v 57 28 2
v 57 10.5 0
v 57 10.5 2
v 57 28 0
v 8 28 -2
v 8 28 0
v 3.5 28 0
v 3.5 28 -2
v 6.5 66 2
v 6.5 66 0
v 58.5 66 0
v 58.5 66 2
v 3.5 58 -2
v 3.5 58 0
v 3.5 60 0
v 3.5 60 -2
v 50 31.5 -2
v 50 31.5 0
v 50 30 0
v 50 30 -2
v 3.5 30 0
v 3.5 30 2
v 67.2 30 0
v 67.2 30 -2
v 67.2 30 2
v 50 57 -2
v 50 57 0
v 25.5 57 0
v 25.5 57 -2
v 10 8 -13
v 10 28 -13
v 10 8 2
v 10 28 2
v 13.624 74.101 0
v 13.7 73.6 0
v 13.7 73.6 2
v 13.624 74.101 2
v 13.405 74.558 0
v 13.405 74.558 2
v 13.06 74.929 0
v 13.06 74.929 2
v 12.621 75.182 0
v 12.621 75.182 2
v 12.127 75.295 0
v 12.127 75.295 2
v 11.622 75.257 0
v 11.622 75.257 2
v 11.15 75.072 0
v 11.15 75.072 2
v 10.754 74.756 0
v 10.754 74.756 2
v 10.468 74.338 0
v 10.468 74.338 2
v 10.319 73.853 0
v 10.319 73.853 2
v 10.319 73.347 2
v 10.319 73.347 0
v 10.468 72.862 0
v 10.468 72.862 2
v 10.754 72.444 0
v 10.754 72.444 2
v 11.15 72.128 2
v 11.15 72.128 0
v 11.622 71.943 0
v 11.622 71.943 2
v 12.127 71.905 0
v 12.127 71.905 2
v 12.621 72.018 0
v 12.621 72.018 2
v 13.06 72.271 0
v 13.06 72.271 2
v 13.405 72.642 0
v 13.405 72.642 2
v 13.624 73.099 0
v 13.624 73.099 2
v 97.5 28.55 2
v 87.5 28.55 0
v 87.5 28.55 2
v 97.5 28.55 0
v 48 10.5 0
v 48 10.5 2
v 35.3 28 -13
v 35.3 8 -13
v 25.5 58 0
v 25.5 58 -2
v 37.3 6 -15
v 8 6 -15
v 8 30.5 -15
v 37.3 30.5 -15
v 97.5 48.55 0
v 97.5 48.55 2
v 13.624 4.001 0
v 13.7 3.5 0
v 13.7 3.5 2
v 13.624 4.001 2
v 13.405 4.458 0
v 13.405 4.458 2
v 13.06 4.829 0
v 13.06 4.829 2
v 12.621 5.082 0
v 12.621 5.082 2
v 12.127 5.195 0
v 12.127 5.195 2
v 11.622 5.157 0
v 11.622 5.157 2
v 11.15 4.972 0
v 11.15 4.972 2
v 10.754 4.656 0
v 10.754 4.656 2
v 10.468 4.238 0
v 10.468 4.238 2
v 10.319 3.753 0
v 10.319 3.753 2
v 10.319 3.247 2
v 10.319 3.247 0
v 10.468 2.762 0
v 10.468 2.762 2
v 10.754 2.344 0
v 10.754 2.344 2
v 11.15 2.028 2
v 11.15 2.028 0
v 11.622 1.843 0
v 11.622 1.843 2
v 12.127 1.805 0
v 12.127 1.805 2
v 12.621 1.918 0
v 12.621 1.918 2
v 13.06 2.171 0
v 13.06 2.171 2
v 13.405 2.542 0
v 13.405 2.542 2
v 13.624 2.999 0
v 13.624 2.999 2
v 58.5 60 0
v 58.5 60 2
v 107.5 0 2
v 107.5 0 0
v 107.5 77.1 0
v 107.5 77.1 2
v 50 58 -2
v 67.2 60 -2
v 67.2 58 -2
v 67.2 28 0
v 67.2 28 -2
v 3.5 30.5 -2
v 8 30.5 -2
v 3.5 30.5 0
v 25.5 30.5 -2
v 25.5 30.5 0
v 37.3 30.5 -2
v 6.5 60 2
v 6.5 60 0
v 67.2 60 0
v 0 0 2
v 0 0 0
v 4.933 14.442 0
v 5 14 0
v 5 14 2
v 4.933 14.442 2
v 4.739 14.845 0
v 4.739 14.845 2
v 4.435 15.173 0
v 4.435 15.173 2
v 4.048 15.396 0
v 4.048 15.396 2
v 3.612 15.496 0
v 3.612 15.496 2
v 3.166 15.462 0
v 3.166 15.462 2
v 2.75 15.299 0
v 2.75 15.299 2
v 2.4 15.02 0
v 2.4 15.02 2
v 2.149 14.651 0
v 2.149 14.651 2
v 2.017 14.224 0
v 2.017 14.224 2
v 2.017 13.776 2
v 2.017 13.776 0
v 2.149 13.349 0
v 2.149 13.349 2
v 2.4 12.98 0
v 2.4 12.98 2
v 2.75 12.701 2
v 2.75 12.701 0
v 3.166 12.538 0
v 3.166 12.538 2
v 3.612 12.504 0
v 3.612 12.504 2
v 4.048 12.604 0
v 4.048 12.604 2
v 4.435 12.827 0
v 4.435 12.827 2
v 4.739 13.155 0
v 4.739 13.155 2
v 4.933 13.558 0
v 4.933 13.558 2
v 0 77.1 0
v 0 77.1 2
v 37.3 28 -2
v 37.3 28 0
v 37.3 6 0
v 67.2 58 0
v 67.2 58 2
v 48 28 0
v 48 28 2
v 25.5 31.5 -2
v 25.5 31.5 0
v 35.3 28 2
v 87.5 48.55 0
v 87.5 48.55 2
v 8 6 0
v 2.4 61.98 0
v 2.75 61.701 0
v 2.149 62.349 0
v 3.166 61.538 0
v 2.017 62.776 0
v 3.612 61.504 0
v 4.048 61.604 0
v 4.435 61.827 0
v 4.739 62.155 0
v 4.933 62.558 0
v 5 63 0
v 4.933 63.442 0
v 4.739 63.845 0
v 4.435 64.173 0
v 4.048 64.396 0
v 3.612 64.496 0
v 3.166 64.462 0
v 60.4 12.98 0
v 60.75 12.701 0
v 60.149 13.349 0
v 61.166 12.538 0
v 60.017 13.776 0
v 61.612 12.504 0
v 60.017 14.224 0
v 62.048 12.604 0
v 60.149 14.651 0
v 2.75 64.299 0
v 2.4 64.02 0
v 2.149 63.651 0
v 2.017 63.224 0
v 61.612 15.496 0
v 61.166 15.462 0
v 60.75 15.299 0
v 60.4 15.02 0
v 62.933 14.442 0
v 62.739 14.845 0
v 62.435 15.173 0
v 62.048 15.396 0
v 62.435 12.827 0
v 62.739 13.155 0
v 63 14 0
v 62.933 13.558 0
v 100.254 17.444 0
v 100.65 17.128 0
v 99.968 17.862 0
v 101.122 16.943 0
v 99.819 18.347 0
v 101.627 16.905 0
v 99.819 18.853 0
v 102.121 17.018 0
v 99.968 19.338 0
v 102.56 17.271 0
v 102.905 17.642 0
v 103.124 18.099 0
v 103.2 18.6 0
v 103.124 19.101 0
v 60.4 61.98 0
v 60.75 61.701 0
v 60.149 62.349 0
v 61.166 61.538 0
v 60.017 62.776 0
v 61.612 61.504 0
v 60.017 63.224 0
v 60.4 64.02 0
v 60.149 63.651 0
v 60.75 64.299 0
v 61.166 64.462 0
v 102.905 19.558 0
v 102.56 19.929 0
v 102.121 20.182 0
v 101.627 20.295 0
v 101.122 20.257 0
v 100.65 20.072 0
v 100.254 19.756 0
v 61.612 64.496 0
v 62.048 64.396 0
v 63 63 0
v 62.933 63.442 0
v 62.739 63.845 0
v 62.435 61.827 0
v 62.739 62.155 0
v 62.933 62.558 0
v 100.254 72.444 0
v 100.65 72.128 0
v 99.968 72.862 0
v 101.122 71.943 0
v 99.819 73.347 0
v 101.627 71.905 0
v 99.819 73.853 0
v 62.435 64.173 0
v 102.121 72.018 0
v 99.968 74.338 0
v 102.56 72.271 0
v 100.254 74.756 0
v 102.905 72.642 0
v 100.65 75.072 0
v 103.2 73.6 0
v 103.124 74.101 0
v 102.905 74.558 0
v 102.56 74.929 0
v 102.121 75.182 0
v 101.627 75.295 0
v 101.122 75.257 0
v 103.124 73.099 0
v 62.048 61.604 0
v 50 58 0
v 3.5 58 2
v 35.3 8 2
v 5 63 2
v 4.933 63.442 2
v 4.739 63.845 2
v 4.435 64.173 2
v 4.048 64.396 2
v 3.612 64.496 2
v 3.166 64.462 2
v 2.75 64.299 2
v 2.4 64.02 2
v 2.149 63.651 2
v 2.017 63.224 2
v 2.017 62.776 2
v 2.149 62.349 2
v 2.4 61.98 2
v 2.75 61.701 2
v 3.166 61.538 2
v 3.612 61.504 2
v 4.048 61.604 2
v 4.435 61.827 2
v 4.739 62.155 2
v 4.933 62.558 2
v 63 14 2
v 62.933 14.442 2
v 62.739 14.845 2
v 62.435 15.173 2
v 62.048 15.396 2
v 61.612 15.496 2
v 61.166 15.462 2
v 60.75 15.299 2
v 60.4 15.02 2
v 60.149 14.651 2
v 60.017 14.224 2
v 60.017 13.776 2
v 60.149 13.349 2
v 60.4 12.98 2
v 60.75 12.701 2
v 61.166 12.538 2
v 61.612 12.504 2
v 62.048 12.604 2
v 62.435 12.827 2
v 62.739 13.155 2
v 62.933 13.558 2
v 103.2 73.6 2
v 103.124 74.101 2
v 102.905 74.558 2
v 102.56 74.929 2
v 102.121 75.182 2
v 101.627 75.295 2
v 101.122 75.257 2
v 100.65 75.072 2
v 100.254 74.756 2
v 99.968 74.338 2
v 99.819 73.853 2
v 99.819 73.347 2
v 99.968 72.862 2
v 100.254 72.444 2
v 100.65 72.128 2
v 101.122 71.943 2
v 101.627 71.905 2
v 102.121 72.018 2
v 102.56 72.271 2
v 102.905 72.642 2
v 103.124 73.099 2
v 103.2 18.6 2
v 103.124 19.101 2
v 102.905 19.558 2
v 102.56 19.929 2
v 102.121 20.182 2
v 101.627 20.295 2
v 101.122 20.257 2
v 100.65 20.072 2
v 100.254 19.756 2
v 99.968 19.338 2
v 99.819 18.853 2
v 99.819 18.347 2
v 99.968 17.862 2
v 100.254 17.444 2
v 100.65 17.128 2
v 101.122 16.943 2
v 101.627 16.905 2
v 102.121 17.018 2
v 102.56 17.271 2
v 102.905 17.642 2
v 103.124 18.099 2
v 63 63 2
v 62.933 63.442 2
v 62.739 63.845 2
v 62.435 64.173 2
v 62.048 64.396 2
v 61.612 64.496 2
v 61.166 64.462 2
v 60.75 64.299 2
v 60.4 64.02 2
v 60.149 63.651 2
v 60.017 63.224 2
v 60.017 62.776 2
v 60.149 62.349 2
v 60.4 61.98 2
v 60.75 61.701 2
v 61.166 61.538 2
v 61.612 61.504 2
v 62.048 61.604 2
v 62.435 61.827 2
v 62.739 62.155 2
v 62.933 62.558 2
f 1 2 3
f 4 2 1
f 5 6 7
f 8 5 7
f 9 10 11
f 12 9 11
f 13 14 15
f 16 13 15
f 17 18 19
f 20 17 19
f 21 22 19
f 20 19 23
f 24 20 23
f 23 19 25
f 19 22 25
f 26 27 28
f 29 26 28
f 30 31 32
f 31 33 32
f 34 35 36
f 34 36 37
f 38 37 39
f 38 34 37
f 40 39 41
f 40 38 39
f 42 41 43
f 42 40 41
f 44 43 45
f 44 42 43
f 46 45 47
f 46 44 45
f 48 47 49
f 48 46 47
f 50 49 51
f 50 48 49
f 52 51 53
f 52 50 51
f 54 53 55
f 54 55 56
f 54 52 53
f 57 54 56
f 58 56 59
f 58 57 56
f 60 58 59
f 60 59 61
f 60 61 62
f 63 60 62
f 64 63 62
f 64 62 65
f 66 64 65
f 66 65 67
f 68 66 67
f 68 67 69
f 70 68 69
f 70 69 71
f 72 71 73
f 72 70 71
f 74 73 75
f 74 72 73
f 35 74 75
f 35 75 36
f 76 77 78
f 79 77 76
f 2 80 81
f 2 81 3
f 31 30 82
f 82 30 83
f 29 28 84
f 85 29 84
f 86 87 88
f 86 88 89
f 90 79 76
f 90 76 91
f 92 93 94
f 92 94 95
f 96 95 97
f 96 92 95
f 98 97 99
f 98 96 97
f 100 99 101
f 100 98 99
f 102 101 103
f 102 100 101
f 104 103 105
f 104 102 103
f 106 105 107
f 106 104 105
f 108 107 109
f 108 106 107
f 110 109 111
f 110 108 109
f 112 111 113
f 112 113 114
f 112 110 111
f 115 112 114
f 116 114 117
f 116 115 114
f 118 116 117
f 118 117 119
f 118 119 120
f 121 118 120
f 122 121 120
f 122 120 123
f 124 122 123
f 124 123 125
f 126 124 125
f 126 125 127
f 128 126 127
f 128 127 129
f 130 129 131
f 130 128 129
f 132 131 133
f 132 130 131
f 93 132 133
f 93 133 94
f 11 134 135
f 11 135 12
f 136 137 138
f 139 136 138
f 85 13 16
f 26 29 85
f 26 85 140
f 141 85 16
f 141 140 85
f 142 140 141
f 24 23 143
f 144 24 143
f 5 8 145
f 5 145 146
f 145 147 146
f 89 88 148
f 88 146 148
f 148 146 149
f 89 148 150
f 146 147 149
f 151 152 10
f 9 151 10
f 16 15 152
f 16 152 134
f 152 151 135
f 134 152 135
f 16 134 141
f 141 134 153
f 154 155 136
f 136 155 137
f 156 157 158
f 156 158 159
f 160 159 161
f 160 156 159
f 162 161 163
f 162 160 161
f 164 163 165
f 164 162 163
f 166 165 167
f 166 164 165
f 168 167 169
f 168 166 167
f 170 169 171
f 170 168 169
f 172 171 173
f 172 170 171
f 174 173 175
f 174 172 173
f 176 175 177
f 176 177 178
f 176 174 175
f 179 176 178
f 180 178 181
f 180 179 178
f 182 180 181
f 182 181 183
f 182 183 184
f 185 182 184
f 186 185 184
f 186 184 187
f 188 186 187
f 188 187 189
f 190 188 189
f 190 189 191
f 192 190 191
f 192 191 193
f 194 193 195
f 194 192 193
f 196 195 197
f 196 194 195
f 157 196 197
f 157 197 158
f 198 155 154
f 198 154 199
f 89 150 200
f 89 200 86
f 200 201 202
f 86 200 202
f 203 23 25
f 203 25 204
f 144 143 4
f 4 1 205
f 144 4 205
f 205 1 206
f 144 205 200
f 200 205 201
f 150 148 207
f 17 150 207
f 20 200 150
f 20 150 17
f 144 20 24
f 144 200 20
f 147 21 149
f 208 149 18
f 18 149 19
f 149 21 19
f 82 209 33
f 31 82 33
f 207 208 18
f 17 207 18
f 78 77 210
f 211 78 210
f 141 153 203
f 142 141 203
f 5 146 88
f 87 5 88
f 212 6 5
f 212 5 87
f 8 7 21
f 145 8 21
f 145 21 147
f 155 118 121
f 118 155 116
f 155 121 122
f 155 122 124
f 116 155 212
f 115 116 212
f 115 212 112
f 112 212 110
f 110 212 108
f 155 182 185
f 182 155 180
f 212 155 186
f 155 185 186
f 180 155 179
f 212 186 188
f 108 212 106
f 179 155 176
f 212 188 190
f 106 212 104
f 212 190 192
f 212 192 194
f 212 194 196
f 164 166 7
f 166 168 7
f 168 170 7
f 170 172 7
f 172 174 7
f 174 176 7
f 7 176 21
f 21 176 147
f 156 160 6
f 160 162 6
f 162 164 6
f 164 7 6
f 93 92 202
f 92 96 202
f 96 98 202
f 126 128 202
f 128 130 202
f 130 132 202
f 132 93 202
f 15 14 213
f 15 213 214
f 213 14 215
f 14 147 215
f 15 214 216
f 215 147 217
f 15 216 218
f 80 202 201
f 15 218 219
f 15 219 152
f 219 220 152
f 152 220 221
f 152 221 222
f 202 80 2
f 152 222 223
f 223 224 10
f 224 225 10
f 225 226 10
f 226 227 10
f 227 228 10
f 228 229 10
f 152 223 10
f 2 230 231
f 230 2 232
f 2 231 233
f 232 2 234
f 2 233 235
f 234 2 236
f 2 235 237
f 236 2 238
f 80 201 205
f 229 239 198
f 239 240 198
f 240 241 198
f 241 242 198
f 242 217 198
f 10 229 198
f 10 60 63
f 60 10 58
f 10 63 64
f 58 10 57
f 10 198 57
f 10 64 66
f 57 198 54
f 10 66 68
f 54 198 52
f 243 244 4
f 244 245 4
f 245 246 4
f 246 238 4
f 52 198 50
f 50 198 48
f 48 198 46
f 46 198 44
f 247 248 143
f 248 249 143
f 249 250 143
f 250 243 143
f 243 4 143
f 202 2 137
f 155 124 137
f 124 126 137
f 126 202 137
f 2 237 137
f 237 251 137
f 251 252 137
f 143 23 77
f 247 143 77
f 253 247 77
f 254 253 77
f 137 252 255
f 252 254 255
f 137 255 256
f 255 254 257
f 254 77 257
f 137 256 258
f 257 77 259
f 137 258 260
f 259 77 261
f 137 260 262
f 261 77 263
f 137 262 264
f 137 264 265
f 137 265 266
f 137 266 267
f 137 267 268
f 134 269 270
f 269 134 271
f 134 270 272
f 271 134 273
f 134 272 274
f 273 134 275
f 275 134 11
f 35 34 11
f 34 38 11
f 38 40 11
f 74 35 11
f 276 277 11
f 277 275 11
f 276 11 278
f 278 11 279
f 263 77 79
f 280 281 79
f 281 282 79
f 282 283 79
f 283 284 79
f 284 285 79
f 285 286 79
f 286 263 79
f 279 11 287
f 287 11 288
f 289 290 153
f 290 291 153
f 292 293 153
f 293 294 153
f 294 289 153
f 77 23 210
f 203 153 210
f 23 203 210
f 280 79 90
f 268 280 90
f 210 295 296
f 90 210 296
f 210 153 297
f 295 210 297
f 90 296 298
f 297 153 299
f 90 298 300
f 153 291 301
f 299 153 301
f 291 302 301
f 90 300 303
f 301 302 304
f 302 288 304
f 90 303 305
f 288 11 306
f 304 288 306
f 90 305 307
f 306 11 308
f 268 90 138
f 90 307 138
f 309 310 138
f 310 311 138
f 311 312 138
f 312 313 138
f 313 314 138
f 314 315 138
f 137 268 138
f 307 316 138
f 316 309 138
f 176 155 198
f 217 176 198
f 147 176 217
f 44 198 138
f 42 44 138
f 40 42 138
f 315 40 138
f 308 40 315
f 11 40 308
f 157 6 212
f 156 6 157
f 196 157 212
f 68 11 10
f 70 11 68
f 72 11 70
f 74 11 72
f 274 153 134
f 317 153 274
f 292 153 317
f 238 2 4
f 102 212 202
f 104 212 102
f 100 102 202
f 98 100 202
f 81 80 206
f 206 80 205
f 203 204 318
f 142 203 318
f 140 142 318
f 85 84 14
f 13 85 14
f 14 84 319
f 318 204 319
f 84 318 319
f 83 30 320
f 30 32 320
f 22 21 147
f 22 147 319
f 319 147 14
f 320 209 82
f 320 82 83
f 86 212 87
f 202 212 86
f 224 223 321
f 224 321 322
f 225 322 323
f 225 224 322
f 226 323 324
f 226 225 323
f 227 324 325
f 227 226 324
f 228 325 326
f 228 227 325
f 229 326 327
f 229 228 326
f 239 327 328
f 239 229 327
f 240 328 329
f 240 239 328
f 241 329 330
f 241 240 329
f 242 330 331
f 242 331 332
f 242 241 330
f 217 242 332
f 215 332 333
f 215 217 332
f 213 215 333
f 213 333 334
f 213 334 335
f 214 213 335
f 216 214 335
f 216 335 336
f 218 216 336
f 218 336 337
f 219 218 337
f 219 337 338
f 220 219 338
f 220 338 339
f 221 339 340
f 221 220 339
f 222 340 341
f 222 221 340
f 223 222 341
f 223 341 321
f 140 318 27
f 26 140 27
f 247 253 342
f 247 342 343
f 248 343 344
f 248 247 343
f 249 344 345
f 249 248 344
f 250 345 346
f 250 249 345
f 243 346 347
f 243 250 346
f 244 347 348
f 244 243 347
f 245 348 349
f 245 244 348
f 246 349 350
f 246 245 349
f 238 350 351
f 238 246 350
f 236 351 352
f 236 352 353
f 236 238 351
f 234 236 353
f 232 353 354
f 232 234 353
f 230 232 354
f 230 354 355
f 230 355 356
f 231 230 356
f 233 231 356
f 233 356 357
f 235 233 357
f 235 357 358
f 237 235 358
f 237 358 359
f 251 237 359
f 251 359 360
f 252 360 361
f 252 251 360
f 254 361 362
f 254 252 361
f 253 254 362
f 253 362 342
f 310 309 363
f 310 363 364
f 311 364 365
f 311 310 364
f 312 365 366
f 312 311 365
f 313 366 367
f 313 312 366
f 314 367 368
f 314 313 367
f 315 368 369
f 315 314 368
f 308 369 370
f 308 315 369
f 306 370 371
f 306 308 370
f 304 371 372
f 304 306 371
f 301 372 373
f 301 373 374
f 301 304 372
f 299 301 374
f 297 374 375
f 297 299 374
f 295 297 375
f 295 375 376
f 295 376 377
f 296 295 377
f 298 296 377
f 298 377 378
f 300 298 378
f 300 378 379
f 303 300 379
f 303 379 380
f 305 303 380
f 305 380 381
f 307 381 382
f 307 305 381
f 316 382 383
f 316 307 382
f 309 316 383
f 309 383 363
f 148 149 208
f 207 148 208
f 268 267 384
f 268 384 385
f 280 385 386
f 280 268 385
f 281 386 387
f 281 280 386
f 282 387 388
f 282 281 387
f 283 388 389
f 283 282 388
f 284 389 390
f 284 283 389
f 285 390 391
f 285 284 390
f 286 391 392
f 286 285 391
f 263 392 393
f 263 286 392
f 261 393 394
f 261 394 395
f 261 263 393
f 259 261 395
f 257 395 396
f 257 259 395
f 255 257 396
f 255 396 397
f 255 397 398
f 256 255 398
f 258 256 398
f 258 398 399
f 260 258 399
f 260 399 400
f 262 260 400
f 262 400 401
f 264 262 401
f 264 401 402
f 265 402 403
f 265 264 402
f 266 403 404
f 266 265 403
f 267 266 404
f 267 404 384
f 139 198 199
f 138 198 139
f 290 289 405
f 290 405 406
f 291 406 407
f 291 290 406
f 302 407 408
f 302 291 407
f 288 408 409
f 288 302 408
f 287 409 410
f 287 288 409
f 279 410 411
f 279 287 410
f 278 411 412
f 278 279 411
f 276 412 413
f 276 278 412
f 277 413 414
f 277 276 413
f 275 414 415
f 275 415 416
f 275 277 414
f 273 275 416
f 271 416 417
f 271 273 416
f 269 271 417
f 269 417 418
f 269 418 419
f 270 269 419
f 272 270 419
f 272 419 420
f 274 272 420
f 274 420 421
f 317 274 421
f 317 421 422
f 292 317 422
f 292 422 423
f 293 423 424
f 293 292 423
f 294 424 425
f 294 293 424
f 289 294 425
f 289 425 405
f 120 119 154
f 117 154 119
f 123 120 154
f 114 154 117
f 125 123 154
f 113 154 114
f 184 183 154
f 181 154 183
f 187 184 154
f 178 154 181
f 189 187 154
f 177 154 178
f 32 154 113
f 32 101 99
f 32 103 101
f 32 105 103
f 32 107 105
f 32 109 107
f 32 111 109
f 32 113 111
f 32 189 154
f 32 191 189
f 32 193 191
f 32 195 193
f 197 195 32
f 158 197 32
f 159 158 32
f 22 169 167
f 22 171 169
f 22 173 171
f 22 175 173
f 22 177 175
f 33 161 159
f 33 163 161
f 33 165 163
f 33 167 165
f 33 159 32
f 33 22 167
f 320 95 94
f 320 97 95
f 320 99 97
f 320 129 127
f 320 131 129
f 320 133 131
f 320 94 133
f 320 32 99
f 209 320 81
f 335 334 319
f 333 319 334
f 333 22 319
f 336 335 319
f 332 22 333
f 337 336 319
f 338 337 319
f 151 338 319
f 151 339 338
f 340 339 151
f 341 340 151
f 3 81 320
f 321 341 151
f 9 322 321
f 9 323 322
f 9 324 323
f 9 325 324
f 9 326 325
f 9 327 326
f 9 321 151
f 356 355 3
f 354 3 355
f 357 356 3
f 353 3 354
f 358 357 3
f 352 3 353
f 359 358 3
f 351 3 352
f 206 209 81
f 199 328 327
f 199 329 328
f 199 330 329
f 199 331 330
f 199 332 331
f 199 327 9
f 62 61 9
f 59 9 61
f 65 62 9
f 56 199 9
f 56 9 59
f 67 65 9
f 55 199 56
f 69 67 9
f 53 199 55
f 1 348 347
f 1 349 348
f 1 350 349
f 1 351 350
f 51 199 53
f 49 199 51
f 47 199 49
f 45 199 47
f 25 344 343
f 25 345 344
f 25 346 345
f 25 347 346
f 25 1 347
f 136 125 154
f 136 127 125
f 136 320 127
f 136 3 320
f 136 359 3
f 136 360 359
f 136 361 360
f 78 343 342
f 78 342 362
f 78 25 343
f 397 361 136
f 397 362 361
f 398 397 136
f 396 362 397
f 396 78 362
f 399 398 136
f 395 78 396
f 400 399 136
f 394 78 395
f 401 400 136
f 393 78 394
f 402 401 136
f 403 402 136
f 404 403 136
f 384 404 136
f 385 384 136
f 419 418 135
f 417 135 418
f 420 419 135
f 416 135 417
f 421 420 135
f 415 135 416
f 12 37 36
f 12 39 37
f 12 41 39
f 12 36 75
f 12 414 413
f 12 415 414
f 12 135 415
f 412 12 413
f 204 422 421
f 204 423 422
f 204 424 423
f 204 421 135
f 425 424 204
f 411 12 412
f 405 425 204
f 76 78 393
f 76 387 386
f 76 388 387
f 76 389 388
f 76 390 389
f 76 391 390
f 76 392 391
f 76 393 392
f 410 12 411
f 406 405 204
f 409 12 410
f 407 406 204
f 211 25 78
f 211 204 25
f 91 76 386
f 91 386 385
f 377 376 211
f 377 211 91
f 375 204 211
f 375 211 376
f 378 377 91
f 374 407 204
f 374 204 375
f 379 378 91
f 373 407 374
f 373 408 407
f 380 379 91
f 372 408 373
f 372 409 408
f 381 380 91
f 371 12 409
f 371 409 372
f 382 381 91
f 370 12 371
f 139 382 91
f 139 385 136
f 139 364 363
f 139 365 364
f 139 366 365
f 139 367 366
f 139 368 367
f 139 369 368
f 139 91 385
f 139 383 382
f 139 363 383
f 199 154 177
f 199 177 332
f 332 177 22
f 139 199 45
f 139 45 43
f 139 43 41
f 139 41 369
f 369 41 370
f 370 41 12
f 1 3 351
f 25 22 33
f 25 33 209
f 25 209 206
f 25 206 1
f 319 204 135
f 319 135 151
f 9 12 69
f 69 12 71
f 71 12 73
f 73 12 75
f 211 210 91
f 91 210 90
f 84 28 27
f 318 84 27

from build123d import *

# Parameters (mm, degrees)
SKETCH_W      = 107.5
SKETCH_H      = 77.1
SKETCH_R      = 1.7
SKETCH_R_2    = 1.5
SKETCH_W_2    = 63.7
SKETCH_H_2    = 28
SKETCH_W_3    = 25.3
SKETCH_H_3    = 20
SKETCH_W_4    = 52
SKETCH_H_4    = 6
SKETCH_W_5    = 10
SKETCH_W_6    = 9
SKETCH_H_5    = 17.5
PAD_DEPTH     = 2
PAD003_DEPTH  = 2
SKETCH005_W   = 29.3
SKETCH005_H   = 24.5
SKETCH005_W_2 = 25.3
SKETCH005_H_2 = 20
PAD004_DEPTH  = 13
SKETCH006_W   = 29.3
SKETCH006_H   = 24.5
PAD005_DEPTH  = 2


with BuildPart() as part:
    # Sketch (on XY_Plane of Origin) → Pad (new body)
    with BuildSketch(Plane.XY):
        with Locations((53.75, 38.55)):
            Rectangle(SKETCH_W, SKETCH_H)
        with Locations((12, 73.6)):
            Circle(SKETCH_R, mode=Mode.SUBTRACT)
        with Locations((12, 3.5)):
            Circle(SKETCH_R, mode=Mode.SUBTRACT)
        with Locations((101.5, 73.6)):
            Circle(SKETCH_R, mode=Mode.SUBTRACT)
        with Locations((101.5, 18.6)):
            Circle(SKETCH_R, mode=Mode.SUBTRACT)
        with Locations((61.5, 63)):
            Circle(SKETCH_R_2, mode=Mode.SUBTRACT)
        with Locations((61.5, 14)):
            Circle(SKETCH_R_2, mode=Mode.SUBTRACT)
        with Locations((3.5, 14)):
            Circle(SKETCH_R_2, mode=Mode.SUBTRACT)
        with Locations((3.5, 63)):
            Circle(SKETCH_R_2, mode=Mode.SUBTRACT)
        with Locations((35.35, 44)):
            Rectangle(SKETCH_W_2, SKETCH_H_2, mode=Mode.SUBTRACT)
        with Locations((22.65, 18)):
            Rectangle(SKETCH_W_3, SKETCH_H_3, mode=Mode.SUBTRACT)
        with Locations((32.5, 63)):
            Rectangle(SKETCH_W_4, SKETCH_H_4, mode=Mode.SUBTRACT)
        with Locations((92.5, 38.55)):
            Rectangle(SKETCH_W_5, SKETCH_H_3, mode=Mode.SUBTRACT)
        with Locations((52.5, 19.25)):
            Rectangle(SKETCH_W_6, SKETCH_H_5, mode=Mode.SUBTRACT)
    extrude(amount=PAD_DEPTH)

    # Sketch004 → Pad003 (join)
    with BuildSketch(Plane(origin=(0, 0, 0), x_dir=(1, 0, 0), z_dir=(0, 0, -1))):
        Polygon((3.5, -58), (3.5, -60), (67.2, -60), (67.2, -58), (50, -58), (50, -57), (25.5, -57), (25.5, -58), align=None)
        Polygon((67.2, -30), (67.2, -28), (3.5, -28), (3.5, -30.5), (25.5, -30.5), (25.5, -31.5), (50, -31.5), (50, -30), align=None)
    extrude(amount=PAD003_DEPTH)

    # Sketch005 (on Face4 of Pad003) → Pad004 (join)
    with BuildSketch(Plane(origin=(0, 0, 0), x_dir=(1, 0, 0), z_dir=(0, 0, -1))):
        with Locations((22.65, -18.25)):
            Rectangle(SKETCH005_W, SKETCH005_H)
        with Locations((22.65, -18)):
            Rectangle(SKETCH005_W_2, SKETCH005_H_2, mode=Mode.SUBTRACT)
    extrude(amount=PAD004_DEPTH)

    # Sketch006 (on Face48 of Pad004) → Pad005 (join)
    with BuildSketch(Plane(origin=(0, 0, -13), x_dir=(1, 0, 0), z_dir=(0, 0, -1))):
        with Locations((22.65, -18.25)):
            Rectangle(SKETCH006_W, SKETCH006_H)
    extrude(amount=PAD005_DEPTH)


solid = part.part
